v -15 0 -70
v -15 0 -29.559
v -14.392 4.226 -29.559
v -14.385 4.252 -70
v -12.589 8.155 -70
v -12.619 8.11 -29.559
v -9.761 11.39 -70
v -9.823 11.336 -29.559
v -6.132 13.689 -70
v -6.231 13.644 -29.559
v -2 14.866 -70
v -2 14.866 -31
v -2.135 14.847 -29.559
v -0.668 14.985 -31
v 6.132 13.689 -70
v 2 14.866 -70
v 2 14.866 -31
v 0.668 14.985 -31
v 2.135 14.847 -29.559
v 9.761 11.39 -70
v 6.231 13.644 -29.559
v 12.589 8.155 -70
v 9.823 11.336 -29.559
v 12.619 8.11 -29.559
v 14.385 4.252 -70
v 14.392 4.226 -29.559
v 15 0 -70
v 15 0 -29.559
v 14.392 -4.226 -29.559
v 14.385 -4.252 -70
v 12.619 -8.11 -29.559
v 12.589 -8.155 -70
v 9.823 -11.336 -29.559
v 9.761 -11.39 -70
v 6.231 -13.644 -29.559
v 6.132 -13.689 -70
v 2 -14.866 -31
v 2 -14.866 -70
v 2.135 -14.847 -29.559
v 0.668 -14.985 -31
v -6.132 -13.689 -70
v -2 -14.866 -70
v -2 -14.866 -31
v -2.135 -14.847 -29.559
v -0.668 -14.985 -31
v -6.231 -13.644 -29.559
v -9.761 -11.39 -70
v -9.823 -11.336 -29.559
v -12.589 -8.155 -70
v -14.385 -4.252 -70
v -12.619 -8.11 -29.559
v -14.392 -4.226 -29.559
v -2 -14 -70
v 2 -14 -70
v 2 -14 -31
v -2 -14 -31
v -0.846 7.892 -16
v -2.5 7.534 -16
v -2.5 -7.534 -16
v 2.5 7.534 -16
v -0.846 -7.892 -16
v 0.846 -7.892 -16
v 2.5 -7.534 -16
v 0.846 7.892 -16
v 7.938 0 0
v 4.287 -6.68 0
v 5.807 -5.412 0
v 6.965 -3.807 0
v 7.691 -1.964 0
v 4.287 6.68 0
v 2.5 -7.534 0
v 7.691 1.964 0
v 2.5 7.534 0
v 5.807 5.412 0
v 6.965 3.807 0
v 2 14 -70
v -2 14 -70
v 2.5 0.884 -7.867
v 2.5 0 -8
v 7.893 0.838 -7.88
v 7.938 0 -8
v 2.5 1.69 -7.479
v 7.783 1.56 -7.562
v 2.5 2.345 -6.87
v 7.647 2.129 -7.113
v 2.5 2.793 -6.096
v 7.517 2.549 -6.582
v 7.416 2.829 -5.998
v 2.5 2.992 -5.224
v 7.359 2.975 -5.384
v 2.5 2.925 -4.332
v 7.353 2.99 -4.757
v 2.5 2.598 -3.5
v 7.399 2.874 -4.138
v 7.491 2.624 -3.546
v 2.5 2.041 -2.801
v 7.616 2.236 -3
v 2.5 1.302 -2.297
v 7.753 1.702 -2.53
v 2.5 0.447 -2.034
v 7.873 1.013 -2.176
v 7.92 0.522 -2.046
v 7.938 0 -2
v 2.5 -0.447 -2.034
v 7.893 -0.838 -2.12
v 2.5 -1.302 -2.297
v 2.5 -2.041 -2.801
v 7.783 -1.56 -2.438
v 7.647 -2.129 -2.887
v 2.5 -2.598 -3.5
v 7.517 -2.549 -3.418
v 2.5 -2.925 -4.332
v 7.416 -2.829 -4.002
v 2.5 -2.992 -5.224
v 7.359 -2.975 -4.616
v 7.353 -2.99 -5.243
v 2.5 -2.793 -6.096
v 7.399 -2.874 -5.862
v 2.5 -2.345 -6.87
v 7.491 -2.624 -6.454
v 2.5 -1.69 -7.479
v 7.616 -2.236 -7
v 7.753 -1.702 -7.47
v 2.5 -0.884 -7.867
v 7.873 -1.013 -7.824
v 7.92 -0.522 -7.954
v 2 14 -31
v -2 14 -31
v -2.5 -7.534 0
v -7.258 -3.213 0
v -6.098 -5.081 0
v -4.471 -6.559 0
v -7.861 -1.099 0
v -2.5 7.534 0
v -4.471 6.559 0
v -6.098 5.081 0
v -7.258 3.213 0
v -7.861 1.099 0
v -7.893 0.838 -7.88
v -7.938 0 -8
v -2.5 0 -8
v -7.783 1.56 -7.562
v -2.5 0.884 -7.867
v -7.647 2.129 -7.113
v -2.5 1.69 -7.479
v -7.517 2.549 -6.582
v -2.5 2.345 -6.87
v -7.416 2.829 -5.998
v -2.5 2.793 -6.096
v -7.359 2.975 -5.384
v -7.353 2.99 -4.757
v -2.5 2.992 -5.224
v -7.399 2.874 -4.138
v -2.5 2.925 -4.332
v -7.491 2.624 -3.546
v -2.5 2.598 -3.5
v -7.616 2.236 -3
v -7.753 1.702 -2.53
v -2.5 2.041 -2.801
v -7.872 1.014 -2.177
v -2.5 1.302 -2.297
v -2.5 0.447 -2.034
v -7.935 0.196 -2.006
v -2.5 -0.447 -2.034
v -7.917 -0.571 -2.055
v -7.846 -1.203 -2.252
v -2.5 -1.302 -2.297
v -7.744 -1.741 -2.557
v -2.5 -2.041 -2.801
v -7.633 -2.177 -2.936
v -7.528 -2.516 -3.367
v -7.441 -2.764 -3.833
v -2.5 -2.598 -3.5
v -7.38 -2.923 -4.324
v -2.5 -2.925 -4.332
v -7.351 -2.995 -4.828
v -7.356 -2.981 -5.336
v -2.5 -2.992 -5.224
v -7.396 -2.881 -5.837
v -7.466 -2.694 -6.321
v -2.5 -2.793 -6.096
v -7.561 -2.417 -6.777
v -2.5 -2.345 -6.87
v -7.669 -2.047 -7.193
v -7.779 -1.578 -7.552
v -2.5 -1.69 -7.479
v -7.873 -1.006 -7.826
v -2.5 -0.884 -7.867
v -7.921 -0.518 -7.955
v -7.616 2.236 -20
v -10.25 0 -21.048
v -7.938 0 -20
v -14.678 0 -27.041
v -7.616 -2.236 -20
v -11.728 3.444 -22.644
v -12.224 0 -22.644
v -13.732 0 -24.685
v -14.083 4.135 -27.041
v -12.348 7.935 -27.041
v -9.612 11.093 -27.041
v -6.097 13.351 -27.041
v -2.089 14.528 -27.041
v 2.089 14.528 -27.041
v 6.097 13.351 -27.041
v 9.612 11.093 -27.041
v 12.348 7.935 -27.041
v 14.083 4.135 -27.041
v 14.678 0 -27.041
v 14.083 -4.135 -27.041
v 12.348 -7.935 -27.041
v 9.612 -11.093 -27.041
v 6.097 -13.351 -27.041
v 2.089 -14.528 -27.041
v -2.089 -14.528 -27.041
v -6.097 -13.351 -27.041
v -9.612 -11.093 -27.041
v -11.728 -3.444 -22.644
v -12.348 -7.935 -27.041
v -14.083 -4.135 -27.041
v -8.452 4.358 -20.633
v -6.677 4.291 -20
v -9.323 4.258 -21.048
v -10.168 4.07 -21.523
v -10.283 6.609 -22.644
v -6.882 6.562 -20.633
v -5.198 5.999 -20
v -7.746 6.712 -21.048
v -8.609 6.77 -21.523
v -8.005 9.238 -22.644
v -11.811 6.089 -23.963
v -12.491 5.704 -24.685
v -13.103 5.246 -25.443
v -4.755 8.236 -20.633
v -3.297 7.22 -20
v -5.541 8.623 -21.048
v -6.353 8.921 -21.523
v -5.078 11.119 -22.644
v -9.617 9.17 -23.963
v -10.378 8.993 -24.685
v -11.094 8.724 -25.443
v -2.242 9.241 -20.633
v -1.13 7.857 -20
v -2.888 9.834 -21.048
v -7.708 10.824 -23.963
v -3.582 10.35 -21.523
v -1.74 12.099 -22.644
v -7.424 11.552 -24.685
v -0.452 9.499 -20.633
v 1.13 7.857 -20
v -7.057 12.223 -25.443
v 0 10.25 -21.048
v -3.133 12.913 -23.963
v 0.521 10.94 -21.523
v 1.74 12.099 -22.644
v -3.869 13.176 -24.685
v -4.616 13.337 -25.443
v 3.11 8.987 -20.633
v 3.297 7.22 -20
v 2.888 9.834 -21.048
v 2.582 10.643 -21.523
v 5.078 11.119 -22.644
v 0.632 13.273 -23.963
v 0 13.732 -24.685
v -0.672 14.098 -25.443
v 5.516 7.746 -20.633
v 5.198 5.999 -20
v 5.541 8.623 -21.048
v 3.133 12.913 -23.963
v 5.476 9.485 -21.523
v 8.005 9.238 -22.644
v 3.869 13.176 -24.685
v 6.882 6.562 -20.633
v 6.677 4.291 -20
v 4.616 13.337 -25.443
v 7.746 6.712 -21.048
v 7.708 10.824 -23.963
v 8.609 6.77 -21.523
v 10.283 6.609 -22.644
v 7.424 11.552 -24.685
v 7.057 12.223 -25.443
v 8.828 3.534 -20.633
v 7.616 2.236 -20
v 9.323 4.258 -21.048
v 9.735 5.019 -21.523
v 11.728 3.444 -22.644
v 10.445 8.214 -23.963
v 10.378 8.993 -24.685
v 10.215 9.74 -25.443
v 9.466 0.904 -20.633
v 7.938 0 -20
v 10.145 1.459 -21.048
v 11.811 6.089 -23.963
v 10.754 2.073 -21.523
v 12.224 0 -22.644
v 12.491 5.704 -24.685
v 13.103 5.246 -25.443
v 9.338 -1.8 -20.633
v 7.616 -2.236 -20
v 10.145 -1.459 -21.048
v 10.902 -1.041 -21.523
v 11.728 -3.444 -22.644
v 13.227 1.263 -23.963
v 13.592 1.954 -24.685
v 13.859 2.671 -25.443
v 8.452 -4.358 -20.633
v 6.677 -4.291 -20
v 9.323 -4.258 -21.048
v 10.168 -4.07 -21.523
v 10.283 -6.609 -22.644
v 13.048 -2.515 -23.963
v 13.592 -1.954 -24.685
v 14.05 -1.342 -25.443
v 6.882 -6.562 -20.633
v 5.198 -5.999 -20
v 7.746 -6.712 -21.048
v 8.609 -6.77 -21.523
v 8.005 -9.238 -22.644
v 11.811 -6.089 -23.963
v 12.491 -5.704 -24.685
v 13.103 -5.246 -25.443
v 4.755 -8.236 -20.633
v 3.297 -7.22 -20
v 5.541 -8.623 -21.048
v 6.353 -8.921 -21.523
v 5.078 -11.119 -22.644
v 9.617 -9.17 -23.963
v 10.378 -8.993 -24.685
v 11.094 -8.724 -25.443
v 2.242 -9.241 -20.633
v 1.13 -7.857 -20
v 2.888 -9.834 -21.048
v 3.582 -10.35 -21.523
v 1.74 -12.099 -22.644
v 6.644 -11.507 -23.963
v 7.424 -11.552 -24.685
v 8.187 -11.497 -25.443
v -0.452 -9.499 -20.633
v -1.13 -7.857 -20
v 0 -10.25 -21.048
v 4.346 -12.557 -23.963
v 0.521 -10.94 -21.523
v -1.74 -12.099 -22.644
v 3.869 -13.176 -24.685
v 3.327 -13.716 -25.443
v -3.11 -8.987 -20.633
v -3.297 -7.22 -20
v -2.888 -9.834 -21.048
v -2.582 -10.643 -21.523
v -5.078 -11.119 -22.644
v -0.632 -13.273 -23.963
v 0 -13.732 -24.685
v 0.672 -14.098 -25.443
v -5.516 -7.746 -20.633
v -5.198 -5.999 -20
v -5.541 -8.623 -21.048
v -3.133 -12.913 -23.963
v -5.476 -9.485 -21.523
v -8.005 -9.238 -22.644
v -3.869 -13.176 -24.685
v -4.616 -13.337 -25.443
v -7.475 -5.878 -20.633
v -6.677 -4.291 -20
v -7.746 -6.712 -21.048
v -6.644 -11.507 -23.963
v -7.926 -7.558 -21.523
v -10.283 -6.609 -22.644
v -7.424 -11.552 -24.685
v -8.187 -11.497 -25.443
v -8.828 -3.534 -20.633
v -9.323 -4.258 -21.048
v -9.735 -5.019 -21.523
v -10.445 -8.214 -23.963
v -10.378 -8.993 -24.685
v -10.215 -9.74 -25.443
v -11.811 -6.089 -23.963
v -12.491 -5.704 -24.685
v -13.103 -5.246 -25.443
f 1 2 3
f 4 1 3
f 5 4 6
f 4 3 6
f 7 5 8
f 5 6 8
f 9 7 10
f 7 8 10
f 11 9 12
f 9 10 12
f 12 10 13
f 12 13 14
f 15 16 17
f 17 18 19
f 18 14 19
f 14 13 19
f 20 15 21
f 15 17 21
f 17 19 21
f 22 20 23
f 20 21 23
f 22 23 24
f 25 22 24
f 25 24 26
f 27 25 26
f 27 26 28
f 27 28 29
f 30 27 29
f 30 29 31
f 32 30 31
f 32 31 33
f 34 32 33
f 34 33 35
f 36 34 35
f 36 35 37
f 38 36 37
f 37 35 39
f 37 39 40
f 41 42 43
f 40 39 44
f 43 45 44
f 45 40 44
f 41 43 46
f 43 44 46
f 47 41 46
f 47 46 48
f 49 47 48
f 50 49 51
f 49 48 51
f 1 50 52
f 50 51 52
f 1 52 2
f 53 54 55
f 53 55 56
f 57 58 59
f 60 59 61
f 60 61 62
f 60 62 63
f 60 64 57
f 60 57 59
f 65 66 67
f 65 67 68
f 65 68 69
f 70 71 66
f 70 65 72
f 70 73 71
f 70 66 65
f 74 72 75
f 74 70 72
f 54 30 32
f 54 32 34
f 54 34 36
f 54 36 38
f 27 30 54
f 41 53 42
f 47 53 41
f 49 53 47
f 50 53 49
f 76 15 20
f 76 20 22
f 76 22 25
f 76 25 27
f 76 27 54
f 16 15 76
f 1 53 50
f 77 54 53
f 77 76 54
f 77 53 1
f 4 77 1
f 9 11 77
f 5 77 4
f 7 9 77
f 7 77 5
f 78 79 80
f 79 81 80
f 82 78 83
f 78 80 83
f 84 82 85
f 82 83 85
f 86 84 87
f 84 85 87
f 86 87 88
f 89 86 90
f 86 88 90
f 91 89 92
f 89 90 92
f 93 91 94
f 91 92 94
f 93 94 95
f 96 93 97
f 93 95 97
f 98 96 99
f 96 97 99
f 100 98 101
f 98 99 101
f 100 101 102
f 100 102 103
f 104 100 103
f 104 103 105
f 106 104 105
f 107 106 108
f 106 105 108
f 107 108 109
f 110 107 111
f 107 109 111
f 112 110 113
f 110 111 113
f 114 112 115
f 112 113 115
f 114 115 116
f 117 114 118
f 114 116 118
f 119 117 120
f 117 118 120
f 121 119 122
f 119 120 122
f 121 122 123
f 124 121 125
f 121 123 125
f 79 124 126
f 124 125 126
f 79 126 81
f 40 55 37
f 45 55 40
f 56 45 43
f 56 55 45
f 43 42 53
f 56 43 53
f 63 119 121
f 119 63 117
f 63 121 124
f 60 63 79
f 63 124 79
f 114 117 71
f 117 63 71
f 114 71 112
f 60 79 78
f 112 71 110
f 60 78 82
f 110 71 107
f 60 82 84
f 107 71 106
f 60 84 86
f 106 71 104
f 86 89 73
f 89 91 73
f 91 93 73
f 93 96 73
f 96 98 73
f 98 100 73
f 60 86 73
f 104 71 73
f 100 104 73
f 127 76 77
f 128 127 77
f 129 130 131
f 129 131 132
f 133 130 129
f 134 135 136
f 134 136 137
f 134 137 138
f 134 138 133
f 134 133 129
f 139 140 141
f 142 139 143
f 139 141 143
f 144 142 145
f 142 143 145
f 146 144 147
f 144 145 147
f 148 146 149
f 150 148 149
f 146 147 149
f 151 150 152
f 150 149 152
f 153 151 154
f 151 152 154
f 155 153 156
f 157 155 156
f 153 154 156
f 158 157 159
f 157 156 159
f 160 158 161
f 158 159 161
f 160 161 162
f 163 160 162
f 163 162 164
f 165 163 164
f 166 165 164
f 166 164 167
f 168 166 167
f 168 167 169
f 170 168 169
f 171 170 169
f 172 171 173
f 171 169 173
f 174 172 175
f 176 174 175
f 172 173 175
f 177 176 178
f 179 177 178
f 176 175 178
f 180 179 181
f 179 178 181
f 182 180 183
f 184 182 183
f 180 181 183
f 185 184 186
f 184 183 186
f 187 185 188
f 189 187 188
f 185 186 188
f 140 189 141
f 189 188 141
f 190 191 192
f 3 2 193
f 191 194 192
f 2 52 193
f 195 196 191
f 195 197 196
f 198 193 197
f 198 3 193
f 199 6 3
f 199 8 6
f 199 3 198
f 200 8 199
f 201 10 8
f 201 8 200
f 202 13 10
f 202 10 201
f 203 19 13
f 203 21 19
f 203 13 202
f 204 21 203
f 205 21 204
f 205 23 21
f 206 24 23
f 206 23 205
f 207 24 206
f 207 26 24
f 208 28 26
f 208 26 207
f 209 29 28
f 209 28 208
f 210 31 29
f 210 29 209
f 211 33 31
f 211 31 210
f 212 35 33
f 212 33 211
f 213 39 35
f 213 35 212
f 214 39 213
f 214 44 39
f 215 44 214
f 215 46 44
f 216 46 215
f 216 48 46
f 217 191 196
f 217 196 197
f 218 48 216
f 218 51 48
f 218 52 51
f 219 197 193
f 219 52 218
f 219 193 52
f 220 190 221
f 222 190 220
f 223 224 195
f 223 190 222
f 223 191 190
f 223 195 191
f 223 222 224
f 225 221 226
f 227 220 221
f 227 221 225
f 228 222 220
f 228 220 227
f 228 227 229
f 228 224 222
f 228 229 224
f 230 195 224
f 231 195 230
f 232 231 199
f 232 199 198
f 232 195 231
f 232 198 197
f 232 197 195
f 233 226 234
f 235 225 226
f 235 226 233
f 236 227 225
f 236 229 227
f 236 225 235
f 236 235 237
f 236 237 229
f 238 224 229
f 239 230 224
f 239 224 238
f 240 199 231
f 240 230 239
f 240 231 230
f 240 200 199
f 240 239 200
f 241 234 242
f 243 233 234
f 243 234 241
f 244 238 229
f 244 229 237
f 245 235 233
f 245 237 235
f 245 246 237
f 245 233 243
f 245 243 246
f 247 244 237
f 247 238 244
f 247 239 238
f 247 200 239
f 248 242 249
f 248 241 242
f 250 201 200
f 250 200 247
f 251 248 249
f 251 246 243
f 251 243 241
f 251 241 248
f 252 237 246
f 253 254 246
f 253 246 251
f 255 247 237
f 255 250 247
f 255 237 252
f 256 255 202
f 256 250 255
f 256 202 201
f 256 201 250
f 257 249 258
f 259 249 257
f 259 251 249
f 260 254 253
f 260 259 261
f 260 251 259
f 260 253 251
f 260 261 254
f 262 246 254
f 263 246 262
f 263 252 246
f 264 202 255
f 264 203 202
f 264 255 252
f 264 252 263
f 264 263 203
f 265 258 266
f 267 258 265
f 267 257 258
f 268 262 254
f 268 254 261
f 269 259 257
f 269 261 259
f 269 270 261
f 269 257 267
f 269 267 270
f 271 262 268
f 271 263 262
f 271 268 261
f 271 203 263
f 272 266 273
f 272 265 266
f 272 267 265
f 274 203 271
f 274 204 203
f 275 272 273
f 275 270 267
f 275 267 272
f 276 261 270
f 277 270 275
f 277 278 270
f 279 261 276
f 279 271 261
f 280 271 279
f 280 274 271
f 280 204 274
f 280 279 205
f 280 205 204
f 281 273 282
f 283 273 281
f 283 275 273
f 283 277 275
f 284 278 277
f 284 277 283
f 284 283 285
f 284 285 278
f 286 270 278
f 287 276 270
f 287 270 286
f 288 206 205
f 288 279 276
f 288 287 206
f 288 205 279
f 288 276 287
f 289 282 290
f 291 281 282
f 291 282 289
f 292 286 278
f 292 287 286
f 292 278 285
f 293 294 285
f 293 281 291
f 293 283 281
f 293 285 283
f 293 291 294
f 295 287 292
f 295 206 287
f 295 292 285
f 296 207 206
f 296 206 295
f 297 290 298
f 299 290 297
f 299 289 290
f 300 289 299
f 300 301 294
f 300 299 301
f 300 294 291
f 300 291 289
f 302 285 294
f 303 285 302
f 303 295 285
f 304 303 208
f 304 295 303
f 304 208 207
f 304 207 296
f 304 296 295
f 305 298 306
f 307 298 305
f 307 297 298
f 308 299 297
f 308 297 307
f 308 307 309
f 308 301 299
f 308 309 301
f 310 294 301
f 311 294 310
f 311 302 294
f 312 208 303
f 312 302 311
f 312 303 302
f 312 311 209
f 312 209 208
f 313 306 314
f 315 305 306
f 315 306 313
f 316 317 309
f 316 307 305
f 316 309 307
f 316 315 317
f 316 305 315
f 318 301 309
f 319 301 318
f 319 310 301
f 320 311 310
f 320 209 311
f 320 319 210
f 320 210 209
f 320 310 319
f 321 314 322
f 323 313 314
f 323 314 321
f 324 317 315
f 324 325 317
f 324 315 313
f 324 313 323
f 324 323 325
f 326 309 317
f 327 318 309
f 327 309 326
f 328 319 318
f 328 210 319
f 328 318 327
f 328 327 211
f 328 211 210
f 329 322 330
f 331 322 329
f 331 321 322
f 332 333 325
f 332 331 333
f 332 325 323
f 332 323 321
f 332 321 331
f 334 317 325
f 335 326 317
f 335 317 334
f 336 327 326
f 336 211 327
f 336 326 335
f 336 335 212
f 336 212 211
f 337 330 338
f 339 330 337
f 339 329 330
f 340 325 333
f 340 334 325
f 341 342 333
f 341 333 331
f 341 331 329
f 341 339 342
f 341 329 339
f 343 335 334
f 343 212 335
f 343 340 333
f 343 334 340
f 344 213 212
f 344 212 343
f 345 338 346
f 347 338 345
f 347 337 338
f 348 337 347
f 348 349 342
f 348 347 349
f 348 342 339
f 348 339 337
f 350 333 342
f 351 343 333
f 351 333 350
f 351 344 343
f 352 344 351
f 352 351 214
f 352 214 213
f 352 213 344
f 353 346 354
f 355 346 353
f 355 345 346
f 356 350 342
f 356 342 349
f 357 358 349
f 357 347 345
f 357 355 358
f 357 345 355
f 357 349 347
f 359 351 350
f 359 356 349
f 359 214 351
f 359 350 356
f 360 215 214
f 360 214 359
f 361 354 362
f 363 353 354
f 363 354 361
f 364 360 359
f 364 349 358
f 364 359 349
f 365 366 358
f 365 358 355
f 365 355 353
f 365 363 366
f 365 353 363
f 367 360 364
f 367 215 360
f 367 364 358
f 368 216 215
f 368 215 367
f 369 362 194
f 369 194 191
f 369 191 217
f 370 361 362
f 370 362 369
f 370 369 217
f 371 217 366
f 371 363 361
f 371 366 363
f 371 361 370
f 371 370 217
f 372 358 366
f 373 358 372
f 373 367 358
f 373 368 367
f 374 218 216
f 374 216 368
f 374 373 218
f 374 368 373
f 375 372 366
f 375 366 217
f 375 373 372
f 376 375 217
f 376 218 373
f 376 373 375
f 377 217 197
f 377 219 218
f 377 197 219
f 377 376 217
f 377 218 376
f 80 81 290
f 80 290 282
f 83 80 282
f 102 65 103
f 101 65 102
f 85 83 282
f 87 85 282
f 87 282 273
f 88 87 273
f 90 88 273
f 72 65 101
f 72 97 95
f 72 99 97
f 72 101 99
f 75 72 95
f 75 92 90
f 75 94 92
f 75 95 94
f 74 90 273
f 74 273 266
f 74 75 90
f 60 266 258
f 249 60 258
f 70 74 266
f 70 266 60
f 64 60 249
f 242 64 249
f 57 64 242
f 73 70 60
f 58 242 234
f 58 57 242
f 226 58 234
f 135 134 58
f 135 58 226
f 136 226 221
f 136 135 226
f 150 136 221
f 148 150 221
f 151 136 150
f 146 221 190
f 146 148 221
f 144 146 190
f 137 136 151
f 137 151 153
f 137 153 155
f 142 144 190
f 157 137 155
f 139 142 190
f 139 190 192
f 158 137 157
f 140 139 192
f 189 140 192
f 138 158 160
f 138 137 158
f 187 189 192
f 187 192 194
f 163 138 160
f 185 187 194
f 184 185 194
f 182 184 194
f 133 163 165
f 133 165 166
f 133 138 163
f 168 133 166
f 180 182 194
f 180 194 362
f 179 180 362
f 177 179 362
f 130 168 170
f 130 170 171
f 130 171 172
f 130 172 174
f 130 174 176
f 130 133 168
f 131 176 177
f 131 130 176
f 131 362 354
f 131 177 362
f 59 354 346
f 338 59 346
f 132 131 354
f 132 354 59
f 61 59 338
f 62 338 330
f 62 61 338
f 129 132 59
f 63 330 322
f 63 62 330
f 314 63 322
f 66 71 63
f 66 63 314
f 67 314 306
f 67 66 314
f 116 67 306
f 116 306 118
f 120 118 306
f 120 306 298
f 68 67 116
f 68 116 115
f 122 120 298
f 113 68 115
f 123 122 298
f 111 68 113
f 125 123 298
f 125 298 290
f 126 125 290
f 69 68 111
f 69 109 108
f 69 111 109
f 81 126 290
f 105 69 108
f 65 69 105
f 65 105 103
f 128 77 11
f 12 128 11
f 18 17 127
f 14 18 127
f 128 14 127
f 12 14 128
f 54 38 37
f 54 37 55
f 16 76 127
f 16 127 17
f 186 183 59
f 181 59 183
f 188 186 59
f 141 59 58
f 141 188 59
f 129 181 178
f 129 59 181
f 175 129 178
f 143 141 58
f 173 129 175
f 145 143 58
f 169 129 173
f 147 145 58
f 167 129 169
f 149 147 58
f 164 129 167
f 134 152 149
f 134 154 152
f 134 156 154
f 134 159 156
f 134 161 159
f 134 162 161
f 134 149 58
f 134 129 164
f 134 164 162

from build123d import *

# Parameters (mm, degrees)
CROQUIS1_R              = 7.9375
SALIENTE_EXTRUIR1_DEPTH = 20
CROQUIS2_R              = 15
SALIENTE_EXTRUIR2_DEPTH = 50
REDONDEO1_R             = 10
CROQUIS3_W              = 5
CROQUIS3_H              = 21.165863944
CORTAR_EXTRUIR1_DEPTH   = 16
CROQUIS4_R              = 3
CORTAR_EXTRUIR2_DEPTH   = 10
CROQUIS5_W              = 4
CROQUIS5_H              = 2
CORTAR_EXTRUIR3_DEPTH   = 39


with BuildPart() as part:
    # Croquis1 → Saliente-Extruir1 (new body)
    with BuildSketch(Plane.XY):
        Circle(CROQUIS1_R)
    extrude(amount=-SALIENTE_EXTRUIR1_DEPTH)

    # Croquis2 → Saliente-Extruir2 (add)
    with BuildSketch(Plane(origin=(0, 0, -20), x_dir=(-1, 0, 0), z_dir=(0, 0, -1))):
        Circle(CROQUIS2_R)
    extrude(amount=SALIENTE_EXTRUIR2_DEPTH)

    # Redondeo1
    # the kernel refuses this fillet: 10 mm, written as the material it takes off along each edge
    with BuildSketch(Plane(origin=(0, 0, -20), x_dir=(-1, 0, 0), z_dir=(0, -1, 0))) as redondeo1_piece_1:
        with BuildLine():
            CenterArc((5, 9.558822822), REDONDEO1_R, 287.082597034, 72.917402966)
            Line((7.9375, 0), (7.99625, -0.191176456))
            ThreePointArc((7.99625, -0.191176456), (11.46875, -0.2), (15, -0.2))
            Line((15, -0.2), (15.2, 0))
            Line((15.2, 0), (15.2, 9.558822822))
            Line((15.2, 9.558822822), (15, 9.558822822))
        make_face()
    revolve(axis=Axis((0, 0, -20), (0, 0, -1)), mode=Mode.SUBTRACT)

    # Croquis3 → Cortar-Extruir1 (cut)
    with BuildSketch(Plane.XY):
        Rectangle(CROQUIS3_W, CROQUIS3_H)
    extrude(amount=-CORTAR_EXTRUIR1_DEPTH, mode=Mode.SUBTRACT)

    # Croquis4 → Cortar-Extruir2 (cut, symmetric)
    with BuildSketch(Plane(origin=(0, 0, 0), x_dir=(0, 0, -1), z_dir=(1, 0, 0))):
        with Locations((5, 0)):
            Circle(CROQUIS4_R)
    extrude(amount=CORTAR_EXTRUIR2_DEPTH, both=True, mode=Mode.SUBTRACT)

    # Croquis5 → Cortar-Extruir3 (cut)
    with BuildSketch(Plane(origin=(0, 0, -70), x_dir=(-1, 0, 0), z_dir=(0, 0, -1))):
        with Locations((0, 15)):
            Rectangle(CROQUIS5_W, CROQUIS5_H)
        with Locations((0, -15)):
            Rectangle(CROQUIS5_W, CROQUIS5_H)
    extrude(amount=-CORTAR_EXTRUIR3_DEPTH, mode=Mode.SUBTRACT)


solid = part.part
